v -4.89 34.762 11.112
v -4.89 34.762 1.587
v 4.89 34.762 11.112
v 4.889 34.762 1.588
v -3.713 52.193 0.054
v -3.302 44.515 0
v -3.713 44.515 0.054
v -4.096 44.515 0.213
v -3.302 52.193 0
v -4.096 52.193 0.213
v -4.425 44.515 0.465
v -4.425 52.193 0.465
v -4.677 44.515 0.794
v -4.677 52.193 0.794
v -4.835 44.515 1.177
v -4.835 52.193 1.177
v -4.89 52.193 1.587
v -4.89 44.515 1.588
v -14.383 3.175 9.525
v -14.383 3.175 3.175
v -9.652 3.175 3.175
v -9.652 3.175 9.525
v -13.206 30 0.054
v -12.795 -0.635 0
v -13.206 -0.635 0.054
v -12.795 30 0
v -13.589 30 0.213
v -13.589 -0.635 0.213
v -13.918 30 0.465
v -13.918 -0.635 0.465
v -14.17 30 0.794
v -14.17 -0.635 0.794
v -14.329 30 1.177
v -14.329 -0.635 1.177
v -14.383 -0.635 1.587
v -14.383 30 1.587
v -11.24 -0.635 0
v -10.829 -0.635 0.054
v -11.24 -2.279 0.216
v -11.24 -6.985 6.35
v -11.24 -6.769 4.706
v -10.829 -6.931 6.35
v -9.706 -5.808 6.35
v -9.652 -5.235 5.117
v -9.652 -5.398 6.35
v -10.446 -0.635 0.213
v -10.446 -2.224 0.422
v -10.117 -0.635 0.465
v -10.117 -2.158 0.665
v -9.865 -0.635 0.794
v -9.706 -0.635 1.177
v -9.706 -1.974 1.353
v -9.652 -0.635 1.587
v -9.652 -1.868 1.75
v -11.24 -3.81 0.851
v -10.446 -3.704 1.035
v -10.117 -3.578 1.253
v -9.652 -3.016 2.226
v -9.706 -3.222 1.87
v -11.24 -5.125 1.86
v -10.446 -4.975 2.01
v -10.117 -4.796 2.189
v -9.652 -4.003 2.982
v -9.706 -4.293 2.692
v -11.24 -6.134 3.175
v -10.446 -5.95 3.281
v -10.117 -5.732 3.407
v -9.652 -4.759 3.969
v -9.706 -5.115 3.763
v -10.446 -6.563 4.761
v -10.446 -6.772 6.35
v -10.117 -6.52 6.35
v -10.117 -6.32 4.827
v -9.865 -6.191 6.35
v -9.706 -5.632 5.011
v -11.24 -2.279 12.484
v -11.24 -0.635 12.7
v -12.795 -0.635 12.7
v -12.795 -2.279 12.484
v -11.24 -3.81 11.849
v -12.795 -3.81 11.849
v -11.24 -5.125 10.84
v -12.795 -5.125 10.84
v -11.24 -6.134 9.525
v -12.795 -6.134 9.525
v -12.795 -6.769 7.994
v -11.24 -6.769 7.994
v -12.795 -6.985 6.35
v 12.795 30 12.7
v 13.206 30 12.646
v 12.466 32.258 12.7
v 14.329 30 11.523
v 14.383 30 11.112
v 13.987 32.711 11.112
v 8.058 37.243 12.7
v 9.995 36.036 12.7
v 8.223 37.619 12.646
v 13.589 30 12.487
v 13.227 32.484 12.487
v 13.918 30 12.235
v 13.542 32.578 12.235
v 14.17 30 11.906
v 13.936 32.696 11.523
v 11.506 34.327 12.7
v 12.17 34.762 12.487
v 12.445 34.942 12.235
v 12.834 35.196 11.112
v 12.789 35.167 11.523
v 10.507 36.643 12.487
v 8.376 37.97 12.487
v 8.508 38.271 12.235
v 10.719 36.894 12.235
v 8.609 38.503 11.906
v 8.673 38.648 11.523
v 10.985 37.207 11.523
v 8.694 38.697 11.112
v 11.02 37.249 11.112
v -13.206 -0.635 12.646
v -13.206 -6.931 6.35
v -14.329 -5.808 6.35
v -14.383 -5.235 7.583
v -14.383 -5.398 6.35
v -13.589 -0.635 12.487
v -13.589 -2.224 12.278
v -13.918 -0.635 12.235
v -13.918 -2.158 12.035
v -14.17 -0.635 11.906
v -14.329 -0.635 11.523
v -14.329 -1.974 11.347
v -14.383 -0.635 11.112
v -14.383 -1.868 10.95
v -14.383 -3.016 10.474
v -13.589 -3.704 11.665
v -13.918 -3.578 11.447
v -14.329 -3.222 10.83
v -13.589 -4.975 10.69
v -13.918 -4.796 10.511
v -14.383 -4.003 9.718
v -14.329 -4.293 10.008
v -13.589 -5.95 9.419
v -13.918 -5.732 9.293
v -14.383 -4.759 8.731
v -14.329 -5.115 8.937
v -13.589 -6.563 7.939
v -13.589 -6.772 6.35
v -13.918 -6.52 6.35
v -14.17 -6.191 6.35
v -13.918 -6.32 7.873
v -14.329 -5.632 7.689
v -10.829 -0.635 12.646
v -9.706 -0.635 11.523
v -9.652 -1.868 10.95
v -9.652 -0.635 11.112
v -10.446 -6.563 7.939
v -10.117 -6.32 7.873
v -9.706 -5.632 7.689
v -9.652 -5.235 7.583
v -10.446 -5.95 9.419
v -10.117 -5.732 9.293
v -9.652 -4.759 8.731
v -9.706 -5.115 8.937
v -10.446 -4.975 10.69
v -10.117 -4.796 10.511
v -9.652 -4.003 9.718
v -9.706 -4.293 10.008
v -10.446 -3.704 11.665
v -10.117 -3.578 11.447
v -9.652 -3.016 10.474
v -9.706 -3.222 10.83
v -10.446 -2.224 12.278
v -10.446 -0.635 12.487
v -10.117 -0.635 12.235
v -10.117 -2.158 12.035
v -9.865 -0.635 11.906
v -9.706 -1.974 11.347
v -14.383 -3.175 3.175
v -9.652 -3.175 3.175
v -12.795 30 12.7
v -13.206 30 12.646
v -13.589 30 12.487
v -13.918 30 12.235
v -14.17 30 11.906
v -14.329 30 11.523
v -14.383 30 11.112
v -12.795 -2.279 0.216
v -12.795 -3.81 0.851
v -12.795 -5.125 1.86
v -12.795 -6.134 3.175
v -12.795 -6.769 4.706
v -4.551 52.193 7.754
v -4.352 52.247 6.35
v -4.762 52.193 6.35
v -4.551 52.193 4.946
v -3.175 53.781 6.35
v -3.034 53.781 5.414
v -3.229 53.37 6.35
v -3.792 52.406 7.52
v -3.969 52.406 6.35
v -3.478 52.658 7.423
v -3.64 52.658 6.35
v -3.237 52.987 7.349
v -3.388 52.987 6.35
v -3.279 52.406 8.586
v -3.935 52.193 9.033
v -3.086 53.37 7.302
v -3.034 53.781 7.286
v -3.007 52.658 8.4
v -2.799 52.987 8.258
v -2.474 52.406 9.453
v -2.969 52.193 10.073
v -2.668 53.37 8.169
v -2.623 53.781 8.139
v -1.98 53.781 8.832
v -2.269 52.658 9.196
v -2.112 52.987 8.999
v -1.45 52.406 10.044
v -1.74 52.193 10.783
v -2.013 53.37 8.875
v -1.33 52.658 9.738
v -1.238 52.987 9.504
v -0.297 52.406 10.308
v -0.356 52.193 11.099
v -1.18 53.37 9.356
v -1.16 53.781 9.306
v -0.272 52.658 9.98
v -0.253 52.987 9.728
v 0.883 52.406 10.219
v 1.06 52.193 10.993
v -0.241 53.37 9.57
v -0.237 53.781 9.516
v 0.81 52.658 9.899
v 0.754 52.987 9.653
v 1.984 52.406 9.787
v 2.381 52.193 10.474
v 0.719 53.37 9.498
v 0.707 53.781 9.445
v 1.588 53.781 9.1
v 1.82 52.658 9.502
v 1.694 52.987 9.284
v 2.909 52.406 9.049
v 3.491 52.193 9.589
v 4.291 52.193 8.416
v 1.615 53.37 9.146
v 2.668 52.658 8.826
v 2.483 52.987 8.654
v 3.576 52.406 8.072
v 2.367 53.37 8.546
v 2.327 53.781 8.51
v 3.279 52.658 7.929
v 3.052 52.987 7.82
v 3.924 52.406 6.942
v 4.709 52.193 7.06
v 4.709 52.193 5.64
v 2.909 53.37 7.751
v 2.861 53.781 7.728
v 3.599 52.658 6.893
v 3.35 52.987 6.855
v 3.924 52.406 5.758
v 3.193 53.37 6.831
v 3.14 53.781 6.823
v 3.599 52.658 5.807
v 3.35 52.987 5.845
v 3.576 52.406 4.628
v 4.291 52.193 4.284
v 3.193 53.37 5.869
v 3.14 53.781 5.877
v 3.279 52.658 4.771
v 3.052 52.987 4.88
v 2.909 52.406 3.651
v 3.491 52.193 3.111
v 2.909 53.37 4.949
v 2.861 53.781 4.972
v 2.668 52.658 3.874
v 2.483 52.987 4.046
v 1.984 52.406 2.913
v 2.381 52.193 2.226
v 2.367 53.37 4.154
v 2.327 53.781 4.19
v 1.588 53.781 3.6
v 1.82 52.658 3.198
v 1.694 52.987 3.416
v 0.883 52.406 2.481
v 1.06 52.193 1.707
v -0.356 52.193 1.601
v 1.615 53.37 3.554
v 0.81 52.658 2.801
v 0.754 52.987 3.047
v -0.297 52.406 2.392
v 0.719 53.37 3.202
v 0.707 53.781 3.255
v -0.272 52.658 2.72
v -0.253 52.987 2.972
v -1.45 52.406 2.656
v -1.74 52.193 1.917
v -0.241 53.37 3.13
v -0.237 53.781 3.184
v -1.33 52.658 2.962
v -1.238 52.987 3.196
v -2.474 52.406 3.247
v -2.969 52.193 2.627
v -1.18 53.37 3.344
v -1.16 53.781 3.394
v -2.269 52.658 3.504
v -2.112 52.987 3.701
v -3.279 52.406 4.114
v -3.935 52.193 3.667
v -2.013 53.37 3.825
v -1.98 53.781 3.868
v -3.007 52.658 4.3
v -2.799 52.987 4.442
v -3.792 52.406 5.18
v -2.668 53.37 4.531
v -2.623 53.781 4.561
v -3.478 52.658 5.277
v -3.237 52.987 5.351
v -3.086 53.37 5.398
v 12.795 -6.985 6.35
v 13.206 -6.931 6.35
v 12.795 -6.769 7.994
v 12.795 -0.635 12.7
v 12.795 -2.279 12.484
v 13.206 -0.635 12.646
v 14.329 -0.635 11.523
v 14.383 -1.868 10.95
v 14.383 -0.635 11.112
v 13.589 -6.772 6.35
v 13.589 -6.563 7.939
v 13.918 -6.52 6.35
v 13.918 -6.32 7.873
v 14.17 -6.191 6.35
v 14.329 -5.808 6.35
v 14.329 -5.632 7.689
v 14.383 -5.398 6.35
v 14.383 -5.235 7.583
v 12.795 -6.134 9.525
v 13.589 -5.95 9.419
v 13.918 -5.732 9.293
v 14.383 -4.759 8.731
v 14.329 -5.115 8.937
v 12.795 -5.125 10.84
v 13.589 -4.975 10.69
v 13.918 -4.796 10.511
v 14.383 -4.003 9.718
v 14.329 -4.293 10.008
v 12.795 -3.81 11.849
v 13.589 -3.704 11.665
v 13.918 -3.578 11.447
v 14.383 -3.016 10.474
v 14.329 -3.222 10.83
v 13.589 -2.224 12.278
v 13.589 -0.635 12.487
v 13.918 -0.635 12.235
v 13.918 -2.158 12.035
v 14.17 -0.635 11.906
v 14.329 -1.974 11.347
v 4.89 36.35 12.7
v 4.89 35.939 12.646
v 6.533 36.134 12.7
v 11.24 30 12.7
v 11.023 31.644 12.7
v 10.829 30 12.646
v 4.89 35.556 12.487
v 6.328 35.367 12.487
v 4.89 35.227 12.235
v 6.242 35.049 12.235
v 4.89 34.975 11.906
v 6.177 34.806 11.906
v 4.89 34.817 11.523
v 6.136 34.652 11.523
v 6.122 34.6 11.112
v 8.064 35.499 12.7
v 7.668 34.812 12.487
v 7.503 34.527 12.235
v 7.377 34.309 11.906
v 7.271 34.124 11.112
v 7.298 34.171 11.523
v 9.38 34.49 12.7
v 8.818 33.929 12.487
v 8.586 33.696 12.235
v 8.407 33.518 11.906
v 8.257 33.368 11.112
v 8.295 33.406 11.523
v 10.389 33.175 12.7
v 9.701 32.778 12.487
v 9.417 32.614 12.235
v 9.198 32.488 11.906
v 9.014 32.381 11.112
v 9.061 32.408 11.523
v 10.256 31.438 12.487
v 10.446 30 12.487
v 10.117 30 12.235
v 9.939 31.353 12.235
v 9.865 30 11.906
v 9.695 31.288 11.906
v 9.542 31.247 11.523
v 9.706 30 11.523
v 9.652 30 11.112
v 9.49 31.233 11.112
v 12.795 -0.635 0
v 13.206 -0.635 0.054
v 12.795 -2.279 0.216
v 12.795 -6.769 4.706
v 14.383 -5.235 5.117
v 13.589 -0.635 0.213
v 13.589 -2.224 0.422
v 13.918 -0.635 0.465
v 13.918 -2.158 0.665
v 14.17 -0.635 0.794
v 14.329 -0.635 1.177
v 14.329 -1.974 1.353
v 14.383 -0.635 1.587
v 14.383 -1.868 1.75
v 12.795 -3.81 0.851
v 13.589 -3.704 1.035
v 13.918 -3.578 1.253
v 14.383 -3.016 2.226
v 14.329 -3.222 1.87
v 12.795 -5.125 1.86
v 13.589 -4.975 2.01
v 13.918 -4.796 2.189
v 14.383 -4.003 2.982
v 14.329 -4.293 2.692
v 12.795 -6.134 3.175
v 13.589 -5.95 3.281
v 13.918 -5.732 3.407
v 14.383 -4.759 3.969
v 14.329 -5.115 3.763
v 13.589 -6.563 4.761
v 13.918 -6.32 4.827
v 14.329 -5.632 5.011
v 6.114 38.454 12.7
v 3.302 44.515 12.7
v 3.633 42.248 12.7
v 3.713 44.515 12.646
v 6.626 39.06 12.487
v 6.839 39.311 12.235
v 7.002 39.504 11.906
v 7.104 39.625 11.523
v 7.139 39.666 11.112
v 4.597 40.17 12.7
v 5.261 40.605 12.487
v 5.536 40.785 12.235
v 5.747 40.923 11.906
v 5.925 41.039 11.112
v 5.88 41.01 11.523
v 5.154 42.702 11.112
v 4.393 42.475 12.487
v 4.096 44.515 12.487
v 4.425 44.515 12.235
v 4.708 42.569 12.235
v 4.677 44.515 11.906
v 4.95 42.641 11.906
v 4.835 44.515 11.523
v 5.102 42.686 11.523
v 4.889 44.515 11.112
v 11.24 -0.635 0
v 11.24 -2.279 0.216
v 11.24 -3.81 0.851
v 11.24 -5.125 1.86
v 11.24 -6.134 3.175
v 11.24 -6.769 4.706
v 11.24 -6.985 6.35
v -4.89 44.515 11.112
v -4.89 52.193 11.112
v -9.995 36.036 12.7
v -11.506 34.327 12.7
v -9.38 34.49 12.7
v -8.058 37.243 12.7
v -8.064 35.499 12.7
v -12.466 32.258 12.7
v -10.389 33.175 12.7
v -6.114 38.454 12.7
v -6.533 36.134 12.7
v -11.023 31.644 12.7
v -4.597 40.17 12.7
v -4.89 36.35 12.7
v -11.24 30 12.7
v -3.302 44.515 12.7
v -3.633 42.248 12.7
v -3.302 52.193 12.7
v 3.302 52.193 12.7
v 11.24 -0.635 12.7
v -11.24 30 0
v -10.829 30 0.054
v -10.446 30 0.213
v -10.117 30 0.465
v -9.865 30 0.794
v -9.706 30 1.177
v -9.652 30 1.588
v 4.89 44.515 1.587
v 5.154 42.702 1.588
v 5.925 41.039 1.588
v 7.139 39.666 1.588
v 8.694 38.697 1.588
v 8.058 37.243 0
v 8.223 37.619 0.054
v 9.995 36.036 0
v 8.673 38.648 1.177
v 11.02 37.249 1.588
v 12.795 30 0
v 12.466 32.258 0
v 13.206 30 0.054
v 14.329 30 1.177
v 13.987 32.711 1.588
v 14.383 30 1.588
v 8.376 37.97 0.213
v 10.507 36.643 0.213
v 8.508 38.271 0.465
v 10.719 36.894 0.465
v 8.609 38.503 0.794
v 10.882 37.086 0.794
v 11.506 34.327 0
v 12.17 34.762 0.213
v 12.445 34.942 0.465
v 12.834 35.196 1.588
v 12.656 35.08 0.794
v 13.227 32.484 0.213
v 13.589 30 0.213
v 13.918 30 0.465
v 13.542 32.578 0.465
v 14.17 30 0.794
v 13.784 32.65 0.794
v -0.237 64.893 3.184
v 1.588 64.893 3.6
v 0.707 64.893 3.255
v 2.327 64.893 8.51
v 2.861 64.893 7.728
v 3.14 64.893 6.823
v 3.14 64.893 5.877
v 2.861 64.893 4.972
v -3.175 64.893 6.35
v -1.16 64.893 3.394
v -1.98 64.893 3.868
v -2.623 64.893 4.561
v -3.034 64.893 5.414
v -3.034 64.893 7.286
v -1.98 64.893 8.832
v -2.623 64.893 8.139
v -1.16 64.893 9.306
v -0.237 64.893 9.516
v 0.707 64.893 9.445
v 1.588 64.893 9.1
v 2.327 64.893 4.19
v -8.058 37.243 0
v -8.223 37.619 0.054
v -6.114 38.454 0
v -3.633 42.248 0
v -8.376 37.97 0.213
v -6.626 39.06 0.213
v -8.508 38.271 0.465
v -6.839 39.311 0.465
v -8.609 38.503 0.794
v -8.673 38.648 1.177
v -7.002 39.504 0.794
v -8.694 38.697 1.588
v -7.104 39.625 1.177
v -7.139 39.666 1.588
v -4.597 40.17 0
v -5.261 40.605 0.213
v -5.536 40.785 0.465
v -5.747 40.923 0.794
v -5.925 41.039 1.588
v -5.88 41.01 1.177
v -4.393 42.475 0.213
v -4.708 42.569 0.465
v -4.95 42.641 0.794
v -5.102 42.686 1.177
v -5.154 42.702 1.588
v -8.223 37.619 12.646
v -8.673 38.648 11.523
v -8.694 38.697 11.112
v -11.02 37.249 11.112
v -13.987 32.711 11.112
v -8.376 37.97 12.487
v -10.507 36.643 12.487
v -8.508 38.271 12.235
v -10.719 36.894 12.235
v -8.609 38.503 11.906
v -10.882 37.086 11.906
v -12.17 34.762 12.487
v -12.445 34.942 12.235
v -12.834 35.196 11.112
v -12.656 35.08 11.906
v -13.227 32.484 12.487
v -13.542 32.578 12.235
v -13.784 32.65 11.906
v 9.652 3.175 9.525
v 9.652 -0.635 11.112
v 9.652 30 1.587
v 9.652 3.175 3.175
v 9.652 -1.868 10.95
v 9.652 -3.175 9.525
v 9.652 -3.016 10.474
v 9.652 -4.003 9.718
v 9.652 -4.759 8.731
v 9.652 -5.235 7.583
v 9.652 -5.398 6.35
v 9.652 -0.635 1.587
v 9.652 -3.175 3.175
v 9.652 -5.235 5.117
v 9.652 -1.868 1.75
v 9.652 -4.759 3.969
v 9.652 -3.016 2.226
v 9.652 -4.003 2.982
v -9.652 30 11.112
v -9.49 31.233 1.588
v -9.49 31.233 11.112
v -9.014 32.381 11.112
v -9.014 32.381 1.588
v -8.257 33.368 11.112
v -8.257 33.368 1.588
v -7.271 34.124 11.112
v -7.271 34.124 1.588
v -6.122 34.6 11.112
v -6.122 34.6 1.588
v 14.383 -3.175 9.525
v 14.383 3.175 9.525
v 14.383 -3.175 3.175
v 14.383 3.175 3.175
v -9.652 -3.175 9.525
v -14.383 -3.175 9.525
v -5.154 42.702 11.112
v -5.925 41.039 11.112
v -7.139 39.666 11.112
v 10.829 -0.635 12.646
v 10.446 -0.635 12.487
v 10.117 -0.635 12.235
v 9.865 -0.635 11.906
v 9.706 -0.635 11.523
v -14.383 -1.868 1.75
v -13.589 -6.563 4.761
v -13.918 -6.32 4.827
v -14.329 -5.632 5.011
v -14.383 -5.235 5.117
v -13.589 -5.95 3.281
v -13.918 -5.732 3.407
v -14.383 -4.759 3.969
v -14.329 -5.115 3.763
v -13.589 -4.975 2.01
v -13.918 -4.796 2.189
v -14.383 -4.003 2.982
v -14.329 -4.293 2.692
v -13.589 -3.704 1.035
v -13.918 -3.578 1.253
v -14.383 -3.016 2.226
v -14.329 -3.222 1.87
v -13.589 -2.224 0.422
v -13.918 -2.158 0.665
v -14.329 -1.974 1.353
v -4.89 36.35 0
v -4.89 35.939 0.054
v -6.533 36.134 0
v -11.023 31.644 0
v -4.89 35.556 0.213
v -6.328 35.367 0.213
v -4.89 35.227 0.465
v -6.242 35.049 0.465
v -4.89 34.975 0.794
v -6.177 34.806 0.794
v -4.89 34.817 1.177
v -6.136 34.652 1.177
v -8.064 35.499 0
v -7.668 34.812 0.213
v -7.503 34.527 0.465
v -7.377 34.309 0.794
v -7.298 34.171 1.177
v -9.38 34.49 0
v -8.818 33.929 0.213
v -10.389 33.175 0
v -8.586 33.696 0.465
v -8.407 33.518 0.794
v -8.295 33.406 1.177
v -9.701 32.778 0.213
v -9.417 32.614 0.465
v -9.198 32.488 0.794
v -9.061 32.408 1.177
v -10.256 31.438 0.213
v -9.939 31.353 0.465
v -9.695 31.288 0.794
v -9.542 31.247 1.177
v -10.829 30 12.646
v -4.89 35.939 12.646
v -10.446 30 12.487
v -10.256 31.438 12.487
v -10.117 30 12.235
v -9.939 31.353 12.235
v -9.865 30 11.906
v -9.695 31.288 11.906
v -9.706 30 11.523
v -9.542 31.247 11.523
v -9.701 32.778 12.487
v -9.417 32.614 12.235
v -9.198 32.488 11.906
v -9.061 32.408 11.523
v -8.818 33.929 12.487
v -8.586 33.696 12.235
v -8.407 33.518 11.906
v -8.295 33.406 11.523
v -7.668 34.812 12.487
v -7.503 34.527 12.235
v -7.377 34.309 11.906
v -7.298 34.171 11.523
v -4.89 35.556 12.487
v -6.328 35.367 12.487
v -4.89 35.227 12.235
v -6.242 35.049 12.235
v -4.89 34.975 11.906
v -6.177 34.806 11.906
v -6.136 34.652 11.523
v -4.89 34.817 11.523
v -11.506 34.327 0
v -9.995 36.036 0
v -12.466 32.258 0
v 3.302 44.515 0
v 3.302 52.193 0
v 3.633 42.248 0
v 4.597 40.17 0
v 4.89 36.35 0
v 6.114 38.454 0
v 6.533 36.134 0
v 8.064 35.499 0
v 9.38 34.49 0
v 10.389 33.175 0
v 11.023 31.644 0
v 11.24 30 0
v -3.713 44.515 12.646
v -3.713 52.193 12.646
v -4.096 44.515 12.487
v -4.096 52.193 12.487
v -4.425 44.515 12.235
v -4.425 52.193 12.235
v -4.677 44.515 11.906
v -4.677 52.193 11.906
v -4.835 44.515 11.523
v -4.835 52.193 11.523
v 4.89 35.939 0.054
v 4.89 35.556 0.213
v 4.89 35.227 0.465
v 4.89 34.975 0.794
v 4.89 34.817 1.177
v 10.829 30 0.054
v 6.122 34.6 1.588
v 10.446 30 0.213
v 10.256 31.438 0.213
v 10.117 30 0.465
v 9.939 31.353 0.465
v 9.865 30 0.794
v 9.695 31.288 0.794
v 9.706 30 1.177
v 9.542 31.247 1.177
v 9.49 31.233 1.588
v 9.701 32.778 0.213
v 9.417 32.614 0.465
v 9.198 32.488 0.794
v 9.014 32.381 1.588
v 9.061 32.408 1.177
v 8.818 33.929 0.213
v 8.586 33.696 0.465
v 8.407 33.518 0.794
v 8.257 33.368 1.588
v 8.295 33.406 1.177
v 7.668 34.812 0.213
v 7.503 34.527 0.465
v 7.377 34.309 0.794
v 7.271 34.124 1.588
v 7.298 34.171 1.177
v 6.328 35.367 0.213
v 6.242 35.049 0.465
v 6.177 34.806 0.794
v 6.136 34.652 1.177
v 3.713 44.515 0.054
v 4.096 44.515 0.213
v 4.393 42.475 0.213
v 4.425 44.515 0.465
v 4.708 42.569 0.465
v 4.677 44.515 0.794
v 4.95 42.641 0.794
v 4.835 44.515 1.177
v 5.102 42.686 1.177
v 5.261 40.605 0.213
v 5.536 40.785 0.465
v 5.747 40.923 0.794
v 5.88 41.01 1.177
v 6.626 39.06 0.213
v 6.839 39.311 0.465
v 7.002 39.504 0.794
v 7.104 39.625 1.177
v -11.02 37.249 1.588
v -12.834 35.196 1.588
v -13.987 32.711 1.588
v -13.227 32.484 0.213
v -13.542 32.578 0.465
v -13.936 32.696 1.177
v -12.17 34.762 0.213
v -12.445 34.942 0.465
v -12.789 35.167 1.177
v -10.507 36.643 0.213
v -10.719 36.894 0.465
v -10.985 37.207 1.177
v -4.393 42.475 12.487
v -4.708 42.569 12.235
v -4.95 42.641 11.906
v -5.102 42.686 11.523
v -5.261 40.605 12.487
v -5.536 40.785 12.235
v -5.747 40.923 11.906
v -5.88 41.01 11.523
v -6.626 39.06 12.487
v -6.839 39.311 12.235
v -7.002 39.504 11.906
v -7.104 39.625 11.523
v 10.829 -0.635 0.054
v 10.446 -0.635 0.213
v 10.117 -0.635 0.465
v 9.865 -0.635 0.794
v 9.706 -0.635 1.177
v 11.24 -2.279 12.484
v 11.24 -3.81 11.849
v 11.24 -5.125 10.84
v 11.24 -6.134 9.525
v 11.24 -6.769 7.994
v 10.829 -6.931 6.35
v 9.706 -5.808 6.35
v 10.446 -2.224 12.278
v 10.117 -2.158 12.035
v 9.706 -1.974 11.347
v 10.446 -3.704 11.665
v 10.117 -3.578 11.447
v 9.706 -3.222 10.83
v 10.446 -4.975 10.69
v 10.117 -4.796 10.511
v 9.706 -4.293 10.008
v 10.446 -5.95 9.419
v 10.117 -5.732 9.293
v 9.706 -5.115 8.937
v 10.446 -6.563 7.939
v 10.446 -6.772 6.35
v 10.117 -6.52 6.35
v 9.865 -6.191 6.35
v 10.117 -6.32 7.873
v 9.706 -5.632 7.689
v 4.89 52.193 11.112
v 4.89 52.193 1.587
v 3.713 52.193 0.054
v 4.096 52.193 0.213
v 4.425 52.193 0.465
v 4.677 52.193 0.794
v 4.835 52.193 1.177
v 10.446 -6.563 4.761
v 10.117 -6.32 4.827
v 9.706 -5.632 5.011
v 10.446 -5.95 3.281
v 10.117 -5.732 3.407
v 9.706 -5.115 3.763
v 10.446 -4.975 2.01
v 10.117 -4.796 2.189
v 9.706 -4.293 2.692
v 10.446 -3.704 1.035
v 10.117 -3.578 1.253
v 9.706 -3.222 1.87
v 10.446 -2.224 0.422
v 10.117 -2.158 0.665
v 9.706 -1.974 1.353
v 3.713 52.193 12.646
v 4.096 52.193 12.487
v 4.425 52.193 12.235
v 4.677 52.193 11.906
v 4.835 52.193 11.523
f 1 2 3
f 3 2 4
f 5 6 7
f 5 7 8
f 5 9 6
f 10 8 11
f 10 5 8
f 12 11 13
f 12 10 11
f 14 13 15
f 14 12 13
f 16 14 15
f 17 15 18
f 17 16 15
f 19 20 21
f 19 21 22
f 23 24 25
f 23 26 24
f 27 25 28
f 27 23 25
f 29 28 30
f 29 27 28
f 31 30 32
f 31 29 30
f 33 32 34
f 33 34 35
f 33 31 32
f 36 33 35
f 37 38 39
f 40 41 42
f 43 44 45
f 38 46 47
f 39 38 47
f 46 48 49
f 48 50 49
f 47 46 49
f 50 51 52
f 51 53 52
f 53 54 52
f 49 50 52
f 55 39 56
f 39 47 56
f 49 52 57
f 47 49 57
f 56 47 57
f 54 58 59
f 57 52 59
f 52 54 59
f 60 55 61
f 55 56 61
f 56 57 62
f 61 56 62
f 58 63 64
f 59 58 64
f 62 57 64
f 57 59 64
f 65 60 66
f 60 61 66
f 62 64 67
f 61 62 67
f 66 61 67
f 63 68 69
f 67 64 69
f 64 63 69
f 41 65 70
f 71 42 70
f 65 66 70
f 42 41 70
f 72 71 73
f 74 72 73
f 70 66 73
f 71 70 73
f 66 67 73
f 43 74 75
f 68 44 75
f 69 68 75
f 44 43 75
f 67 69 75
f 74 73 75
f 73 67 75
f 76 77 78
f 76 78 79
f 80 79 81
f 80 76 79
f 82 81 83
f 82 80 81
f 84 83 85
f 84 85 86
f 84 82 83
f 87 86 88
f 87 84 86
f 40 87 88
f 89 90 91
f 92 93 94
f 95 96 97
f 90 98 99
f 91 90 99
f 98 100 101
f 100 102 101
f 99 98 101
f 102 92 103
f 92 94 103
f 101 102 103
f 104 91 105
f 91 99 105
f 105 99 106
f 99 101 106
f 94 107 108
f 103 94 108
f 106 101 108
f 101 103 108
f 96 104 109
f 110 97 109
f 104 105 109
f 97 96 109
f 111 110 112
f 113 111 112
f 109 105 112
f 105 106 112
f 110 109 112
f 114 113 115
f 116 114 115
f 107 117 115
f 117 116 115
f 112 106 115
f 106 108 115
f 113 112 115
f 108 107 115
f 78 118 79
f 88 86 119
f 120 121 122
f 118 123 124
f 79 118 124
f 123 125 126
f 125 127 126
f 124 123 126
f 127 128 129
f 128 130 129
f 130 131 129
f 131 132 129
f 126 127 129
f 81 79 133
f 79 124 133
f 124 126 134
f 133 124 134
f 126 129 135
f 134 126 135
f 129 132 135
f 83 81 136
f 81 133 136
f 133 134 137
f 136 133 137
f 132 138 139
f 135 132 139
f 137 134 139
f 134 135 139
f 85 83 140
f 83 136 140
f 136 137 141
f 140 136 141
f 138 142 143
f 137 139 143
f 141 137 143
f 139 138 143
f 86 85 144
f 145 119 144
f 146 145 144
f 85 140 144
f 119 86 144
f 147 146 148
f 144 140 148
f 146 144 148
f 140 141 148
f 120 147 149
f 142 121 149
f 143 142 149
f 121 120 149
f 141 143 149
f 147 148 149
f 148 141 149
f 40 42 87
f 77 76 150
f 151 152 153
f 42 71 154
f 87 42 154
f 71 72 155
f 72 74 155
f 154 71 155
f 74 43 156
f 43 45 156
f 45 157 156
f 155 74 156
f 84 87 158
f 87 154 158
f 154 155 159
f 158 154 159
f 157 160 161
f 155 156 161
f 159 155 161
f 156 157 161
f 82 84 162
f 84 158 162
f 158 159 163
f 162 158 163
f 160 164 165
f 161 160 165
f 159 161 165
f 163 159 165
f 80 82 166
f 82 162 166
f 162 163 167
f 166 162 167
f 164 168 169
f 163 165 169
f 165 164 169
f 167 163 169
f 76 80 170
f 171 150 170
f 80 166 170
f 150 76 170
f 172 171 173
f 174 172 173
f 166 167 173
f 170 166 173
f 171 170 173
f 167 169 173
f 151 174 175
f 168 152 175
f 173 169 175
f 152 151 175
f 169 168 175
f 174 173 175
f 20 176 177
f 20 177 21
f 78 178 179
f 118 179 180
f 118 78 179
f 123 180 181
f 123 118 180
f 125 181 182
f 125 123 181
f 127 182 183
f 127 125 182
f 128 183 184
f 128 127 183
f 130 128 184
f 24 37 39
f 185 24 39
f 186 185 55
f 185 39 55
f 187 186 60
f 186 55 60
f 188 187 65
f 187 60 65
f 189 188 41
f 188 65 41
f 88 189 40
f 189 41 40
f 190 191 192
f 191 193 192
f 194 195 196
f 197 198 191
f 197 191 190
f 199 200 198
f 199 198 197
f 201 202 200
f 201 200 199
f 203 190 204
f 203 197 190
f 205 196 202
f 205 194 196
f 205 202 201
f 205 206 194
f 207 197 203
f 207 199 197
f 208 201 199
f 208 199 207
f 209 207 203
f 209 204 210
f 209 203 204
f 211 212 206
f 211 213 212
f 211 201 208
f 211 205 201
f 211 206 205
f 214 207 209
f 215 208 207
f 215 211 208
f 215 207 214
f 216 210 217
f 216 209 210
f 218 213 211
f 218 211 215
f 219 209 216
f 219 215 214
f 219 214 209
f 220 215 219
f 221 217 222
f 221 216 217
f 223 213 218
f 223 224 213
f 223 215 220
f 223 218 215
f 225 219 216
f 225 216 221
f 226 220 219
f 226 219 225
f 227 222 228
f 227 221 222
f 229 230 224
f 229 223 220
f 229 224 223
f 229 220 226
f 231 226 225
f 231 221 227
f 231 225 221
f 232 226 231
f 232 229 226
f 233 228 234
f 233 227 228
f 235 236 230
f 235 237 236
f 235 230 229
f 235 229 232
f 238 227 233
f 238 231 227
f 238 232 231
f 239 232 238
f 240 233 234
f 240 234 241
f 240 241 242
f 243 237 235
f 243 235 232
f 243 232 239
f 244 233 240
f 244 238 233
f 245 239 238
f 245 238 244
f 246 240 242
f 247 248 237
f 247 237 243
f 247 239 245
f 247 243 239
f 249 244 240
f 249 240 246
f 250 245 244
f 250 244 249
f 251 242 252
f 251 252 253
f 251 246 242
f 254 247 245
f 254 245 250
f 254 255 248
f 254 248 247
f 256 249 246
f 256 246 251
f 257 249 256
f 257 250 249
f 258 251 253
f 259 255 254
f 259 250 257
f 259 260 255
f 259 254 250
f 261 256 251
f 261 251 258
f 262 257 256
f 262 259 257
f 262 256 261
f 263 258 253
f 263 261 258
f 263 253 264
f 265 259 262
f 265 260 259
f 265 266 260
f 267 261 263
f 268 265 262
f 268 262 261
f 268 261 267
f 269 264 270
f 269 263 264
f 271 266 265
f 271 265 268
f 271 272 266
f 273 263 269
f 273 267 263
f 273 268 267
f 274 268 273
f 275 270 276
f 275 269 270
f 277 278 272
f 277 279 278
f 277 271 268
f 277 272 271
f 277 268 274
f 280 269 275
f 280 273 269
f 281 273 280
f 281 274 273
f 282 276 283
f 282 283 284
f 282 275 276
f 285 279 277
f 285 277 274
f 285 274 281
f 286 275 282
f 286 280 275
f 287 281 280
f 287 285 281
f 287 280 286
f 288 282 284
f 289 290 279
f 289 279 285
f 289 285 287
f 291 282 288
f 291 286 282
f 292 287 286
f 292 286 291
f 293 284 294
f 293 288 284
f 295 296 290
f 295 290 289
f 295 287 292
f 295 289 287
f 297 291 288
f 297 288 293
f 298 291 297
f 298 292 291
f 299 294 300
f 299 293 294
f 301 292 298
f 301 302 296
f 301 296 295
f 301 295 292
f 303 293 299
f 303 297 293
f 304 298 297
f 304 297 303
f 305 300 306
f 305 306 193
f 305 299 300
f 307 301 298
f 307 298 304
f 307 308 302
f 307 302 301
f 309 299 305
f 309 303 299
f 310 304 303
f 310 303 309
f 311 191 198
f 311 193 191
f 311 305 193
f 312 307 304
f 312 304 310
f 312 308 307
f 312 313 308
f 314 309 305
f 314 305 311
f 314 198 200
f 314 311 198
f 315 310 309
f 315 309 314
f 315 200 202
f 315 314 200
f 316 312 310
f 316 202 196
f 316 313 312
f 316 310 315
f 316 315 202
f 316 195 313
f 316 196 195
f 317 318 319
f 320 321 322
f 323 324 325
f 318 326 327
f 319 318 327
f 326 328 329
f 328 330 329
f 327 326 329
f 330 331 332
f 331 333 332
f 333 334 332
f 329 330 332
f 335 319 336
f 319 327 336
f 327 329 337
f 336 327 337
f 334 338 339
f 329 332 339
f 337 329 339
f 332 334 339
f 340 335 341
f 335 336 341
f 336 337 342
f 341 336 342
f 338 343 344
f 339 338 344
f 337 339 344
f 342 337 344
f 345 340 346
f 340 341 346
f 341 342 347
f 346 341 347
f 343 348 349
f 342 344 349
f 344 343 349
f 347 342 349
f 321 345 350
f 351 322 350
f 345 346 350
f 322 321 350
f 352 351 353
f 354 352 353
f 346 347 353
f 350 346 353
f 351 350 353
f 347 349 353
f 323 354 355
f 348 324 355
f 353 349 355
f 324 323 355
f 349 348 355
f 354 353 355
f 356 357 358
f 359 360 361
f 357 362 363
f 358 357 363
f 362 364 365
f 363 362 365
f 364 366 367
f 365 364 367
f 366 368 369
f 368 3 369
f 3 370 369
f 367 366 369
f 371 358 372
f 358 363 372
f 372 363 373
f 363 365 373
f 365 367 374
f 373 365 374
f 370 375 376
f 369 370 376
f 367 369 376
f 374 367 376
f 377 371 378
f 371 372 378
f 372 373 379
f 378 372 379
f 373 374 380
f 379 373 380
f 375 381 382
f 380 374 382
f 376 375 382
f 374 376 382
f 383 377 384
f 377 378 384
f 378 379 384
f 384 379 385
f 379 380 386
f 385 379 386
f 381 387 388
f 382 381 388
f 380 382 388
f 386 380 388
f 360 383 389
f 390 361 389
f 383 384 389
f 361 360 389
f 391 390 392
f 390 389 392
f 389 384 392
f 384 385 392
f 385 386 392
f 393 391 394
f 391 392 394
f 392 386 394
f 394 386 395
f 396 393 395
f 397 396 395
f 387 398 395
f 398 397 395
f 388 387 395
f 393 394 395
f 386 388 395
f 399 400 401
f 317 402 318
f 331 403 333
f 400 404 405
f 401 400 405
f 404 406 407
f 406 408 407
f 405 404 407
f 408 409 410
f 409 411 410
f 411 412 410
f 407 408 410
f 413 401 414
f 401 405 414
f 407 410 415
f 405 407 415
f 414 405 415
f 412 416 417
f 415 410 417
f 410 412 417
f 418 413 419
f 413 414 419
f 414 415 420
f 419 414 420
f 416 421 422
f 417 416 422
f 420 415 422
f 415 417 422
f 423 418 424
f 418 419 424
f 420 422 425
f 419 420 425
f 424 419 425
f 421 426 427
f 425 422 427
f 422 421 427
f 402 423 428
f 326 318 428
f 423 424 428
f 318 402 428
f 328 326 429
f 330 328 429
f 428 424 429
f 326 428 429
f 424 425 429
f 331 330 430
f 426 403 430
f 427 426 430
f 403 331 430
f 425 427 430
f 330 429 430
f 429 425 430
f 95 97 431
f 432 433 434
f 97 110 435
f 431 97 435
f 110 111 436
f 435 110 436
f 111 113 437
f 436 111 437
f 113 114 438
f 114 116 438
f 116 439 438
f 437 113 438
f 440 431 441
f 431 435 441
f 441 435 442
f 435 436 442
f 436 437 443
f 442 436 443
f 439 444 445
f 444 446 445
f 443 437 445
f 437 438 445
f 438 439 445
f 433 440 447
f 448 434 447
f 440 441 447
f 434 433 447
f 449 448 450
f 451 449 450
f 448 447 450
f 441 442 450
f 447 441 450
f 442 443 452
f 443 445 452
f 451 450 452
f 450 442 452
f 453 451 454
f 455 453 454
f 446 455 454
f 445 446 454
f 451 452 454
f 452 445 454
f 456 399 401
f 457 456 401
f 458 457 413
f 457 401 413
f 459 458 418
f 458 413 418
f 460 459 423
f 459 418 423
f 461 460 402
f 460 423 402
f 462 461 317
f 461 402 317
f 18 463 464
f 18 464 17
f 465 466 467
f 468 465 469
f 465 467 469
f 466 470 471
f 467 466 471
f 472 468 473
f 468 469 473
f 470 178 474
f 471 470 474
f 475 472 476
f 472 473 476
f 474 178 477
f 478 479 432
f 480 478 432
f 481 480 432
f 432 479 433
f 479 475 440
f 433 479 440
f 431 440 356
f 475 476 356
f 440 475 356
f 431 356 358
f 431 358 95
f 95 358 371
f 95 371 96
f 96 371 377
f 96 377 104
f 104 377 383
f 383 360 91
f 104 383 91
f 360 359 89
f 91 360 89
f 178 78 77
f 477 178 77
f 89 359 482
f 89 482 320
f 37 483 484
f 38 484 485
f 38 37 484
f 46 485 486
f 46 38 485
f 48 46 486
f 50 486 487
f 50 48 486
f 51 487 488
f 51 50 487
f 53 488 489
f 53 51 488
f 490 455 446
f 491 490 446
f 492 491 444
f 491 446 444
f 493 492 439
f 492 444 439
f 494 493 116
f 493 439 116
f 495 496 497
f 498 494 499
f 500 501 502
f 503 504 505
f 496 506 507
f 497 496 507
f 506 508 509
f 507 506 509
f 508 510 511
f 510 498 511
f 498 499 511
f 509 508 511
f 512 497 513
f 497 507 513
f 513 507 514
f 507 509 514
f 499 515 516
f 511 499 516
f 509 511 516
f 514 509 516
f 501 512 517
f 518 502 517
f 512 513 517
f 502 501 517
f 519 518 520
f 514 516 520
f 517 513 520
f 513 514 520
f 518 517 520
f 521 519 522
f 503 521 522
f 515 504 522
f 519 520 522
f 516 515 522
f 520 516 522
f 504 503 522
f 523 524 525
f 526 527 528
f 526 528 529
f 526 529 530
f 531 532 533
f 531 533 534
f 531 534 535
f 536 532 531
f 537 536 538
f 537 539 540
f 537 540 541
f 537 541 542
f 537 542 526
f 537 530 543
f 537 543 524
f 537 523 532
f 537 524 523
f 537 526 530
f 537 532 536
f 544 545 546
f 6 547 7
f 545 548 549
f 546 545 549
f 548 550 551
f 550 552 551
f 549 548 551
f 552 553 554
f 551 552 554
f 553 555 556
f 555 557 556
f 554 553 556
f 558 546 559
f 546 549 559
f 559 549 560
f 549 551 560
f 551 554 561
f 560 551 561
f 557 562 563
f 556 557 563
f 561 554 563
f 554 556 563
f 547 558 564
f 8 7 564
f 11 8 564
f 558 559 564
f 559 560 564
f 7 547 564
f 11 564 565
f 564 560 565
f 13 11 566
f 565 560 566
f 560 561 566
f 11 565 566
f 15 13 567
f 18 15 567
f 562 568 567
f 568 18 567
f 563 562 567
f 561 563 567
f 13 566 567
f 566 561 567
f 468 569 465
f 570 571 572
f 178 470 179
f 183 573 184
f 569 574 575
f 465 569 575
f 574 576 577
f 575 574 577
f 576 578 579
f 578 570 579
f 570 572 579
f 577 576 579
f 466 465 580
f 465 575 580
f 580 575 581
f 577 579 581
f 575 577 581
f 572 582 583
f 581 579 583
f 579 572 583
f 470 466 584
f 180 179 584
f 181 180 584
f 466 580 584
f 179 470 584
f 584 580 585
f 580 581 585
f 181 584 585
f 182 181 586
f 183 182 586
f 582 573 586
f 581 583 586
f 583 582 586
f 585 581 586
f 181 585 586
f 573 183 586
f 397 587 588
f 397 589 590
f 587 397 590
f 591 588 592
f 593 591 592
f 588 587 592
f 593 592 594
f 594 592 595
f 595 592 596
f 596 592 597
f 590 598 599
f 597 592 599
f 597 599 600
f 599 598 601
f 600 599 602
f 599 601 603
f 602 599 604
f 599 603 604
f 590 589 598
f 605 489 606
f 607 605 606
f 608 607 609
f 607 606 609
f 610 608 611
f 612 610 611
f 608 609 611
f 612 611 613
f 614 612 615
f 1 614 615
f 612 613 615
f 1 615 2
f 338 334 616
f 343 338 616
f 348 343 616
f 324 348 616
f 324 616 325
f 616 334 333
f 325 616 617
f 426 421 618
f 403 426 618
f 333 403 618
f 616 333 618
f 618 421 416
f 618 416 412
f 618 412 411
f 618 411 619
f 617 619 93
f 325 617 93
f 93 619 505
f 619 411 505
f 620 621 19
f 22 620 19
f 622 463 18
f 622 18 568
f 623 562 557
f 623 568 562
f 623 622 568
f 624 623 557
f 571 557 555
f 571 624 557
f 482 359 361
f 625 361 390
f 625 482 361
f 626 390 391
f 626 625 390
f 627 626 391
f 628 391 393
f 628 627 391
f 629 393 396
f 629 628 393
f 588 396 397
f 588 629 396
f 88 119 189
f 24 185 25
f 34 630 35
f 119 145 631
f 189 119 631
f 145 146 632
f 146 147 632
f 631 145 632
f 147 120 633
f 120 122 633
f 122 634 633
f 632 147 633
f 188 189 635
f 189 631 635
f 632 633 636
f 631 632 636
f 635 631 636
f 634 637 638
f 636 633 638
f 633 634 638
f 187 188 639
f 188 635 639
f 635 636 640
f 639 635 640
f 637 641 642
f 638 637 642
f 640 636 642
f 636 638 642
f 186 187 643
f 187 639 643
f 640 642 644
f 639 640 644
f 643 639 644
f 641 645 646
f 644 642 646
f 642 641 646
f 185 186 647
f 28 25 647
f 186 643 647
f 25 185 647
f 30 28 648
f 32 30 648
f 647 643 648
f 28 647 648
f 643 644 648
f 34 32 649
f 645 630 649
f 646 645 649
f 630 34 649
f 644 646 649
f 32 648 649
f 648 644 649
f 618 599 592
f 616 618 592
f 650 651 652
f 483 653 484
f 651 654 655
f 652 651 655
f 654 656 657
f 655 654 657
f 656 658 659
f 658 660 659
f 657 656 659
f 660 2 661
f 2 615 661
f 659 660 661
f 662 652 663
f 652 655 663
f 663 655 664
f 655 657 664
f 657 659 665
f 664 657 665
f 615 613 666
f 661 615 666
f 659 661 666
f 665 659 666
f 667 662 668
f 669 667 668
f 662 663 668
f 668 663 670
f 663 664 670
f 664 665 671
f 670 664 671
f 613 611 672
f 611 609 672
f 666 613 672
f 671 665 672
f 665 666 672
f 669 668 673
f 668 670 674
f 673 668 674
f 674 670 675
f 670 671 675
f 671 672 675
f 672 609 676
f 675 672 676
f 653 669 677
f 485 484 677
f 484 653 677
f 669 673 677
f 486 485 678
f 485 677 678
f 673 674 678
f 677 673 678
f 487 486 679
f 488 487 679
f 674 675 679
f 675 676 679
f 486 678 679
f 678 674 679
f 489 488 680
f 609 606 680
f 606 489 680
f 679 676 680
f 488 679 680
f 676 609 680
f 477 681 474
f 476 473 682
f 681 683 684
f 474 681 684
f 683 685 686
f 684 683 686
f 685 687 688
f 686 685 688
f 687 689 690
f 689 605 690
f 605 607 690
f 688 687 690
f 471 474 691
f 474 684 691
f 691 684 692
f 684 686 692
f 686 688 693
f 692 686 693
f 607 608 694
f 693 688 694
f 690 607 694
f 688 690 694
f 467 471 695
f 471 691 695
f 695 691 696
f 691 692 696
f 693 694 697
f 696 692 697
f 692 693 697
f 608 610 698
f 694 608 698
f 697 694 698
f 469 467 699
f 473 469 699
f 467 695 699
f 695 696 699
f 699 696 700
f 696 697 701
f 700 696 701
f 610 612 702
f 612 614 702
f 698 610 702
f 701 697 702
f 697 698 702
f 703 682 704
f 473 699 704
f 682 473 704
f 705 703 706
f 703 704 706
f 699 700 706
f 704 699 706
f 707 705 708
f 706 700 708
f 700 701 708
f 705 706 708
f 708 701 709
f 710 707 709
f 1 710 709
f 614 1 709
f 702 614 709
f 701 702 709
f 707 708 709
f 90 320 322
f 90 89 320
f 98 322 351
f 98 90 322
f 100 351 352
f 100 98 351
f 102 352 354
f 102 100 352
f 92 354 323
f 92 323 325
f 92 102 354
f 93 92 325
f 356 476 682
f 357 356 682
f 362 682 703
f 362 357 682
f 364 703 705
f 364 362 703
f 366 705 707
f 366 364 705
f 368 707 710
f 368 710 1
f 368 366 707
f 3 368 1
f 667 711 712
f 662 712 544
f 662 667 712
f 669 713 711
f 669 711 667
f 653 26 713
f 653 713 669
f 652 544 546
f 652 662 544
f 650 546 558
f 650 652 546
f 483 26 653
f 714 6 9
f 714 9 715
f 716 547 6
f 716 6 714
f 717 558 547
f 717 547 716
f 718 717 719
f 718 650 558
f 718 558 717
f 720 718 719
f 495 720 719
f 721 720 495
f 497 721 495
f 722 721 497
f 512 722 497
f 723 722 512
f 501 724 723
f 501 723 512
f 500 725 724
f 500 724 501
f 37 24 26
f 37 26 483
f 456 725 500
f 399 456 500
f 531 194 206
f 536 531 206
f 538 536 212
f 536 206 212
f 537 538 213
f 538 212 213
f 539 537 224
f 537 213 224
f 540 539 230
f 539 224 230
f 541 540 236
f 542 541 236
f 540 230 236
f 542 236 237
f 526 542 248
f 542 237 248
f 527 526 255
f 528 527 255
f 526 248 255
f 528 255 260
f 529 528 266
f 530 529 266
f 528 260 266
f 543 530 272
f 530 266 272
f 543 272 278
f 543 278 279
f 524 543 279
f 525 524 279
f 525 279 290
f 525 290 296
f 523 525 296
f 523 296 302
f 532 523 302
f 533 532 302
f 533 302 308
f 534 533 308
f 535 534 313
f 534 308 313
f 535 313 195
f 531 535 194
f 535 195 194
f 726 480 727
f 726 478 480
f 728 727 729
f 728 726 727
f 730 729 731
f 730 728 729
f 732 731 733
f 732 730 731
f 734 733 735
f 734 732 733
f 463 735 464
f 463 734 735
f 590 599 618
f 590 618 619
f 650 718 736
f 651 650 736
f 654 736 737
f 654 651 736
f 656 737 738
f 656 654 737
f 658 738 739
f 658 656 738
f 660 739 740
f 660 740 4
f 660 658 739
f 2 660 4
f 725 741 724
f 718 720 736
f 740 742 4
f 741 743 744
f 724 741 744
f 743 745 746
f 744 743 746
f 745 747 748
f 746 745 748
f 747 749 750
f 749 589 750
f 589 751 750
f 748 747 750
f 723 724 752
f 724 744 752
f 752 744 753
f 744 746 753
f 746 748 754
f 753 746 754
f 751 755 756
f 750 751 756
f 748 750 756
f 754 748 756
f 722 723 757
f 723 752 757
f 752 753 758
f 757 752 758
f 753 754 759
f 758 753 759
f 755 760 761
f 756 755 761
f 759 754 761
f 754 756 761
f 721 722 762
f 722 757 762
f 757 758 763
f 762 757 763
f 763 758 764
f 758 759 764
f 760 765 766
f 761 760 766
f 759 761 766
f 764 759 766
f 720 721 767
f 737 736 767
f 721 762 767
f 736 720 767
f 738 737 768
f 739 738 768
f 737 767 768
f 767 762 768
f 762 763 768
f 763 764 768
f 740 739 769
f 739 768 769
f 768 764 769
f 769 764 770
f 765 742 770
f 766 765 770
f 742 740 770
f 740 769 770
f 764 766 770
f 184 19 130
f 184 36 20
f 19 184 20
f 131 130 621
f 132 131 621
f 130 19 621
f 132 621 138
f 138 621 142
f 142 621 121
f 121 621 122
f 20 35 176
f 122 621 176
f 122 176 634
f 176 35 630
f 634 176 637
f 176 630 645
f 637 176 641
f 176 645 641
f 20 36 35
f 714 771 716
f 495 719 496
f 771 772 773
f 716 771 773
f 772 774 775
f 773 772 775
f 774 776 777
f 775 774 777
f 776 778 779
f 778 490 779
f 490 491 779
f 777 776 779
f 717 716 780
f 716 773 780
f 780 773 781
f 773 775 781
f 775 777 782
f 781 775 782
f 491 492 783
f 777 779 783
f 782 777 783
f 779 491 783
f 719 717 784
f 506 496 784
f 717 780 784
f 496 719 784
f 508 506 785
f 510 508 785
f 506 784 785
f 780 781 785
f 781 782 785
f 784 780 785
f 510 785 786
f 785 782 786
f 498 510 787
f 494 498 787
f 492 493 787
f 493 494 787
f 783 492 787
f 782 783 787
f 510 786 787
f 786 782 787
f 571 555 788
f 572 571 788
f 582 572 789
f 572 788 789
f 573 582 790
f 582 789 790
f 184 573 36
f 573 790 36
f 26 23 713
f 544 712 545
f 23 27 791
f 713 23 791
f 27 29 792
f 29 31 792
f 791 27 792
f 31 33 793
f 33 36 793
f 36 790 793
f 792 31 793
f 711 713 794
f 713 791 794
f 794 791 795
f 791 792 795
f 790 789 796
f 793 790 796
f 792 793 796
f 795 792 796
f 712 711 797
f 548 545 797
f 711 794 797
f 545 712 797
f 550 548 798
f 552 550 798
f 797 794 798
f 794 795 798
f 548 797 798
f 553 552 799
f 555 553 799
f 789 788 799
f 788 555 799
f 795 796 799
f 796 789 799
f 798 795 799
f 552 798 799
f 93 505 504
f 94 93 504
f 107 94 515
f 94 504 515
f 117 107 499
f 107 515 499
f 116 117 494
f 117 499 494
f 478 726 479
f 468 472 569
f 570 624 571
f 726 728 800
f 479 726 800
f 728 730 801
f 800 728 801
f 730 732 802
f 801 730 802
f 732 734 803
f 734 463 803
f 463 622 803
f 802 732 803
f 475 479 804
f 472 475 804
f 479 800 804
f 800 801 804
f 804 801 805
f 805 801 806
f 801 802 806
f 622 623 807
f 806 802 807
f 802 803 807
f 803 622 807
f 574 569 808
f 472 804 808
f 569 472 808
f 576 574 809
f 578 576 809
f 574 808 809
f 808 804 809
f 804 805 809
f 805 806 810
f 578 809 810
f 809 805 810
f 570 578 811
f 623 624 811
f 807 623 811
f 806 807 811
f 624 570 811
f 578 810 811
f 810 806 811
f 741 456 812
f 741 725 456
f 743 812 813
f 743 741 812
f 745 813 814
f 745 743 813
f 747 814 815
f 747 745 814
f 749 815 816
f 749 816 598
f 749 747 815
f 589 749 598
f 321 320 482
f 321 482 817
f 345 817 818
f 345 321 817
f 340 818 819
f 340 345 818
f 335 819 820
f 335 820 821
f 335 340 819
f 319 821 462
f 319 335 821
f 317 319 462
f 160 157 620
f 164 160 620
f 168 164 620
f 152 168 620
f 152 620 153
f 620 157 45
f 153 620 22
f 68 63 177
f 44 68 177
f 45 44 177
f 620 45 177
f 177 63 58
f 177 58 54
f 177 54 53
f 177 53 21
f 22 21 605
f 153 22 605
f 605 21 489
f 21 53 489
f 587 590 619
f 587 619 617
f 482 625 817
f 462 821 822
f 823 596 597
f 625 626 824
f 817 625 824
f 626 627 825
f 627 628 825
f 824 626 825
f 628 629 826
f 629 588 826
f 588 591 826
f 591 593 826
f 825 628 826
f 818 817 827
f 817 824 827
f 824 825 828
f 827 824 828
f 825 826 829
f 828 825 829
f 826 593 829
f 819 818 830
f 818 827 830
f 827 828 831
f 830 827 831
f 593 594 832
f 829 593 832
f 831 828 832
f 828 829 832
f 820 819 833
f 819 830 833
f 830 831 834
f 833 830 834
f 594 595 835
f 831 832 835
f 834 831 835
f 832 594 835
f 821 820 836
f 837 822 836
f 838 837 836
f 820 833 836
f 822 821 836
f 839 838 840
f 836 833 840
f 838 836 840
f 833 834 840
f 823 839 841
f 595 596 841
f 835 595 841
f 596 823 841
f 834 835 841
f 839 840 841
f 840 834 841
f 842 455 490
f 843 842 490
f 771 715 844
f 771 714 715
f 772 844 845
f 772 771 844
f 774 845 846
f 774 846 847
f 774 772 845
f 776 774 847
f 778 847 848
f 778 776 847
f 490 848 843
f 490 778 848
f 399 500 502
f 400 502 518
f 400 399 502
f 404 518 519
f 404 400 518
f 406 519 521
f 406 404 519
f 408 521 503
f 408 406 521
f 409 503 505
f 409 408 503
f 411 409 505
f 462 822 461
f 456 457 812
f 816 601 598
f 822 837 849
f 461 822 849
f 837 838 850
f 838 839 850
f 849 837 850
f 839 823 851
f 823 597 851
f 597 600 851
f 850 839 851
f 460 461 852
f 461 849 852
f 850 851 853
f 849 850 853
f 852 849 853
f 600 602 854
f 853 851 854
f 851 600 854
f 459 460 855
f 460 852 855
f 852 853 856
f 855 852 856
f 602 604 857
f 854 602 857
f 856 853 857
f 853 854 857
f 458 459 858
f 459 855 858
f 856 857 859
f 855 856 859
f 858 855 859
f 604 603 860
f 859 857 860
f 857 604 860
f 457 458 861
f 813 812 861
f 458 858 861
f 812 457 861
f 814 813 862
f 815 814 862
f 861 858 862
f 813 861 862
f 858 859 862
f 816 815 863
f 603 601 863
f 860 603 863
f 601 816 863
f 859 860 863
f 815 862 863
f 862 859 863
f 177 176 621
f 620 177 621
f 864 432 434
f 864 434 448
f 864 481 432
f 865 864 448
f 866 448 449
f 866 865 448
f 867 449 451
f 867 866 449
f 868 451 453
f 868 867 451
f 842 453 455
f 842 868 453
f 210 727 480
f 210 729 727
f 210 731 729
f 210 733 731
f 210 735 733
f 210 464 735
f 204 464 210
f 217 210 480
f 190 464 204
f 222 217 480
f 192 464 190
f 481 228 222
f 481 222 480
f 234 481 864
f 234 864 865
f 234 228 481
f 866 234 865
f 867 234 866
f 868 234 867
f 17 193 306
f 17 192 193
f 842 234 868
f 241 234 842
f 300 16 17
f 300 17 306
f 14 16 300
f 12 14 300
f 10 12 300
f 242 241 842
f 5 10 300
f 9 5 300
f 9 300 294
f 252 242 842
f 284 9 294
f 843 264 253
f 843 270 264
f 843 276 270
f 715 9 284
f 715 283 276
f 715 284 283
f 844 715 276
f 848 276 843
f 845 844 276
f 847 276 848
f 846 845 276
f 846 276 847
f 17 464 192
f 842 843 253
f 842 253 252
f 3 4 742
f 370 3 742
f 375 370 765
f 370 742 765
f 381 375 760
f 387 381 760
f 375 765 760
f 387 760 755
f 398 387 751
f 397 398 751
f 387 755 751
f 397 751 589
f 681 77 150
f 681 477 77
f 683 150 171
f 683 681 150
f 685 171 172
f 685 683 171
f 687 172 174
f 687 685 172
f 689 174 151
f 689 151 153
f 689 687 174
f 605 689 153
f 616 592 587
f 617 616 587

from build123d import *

# Parameters (mm, degrees)
BOSS_EXTRUDE1_DEPTH = 12.7
SKETCH2_W           = 9.779
SKETCH2_H           = 12.7
BOSS_EXTRUDE2_DEPTH = 12.7
FILLET1_R           = 6.35
SKETCH3_R           = 3.175
BOSS_EXTRUDE3_DEPTH = 12.7
SKETCH4_W           = 6.35
SKETCH4_H           = 6.35
CUT_EXTRUDE1_DEPTH  = 43.688
FILLET2_R           = 6.35
FILLET5_R           = 1.5875
FILLET7_R           = 1.5875


with BuildPart() as part:
    # Sketch1 → Boss-Extrude1 (new body)
    with BuildSketch(Plane.XY):
        with BuildLine():
            Line((9.652, 30), (9.652, -6.985))
            Line((9.652, -6.985), (14.38275, -6.985))
            Line((14.38275, -6.985), (14.38275, 30))
            ThreePointArc((14.38275, 30), (11.60224145, 36.71274145), (4.8895, 39.49325))
            Line((4.8895, 39.49325), (-4.8895, 39.49325))
            ThreePointArc((-4.8895, 39.49325), (-11.60224145, 36.71274145), (-14.38275, 30))
            Line((-14.38275, 30), (-14.38275, -6.985))
            Line((-14.38275, -6.985), (-9.652, -6.985))
            Line((-9.652, -6.985), (-9.652, 30))
            ThreePointArc((-9.652, 30), (-8.257096045, 33.367596045), (-4.8895, 34.7625))
            Line((-4.8895, 34.7625), (4.8895, 34.7625))
            ThreePointArc((4.8895, 34.7625), (8.257096045, 33.367596045), (9.652, 30))
        make_face()
    extrude(amount=BOSS_EXTRUDE1_DEPTH)

    # Sketch2 → Boss-Extrude2 (add)
    with BuildSketch(Plane(origin=(0, 39.49325, 0), x_dir=(1, 0, 0), z_dir=(0, 1, 0))):
        with Locations((0, -6.35)):
            Rectangle(SKETCH2_W, SKETCH2_H)
    extrude(amount=BOSS_EXTRUDE2_DEPTH)

    # Fillet1
    fillet1_edges = [part.edges().sort_by_distance(p)[0] for p in [
        (4.8895, 39.49325, 6.35),
        (-4.8895, 39.49325, 6.35),
    ]]
    fillet(fillet1_edges, radius=FILLET1_R)

    # Sketch3 → Boss-Extrude3 (add)
    with BuildSketch(Plane(origin=(0, 52.19325, 0), x_dir=(1, 0, 0), z_dir=(0, 1, 0))):
        with Locations(Location((0, -6.35, 0), (0, 0, 180))):
            Circle(SKETCH3_R)
    extrude(amount=BOSS_EXTRUDE3_DEPTH)

    # Sketch4 → Cut-Extrude1 (cut)
    with BuildSketch(Plane.ZY.offset(14.38275)):
        with Locations((6.35, 0)):
            Rectangle(SKETCH4_W, SKETCH4_H)
    extrude(amount=-CUT_EXTRUDE1_DEPTH, mode=Mode.SUBTRACT)

    # Fillet2
    fillet2_edges = [part.edges().sort_by_distance(p)[0] for p in [
        (12.017375, -6.985, 0),
        (12.017375, -6.985, 12.7),
        (-12.017375, -6.985, 0),
        (-12.017375, -6.985, 12.7),
    ]]
    fillet(fillet2_edges, radius=FILLET2_R - 0.0001)  # a hair under: the kernel refuses the full size

    # Fillet5
    fillet5_edges = [part.edges().sort_by_distance(p)[0] for p in [
        (-14.38275, 14.68245, 12.7),
        (-9.652, 14.68245, 12.7),
        (9.652, 14.68245, 12.7),
        (14.38275, 14.68245, 12.7),
        (14.38275, 14.68245, 0),
        (14.38275, -5.12515735, 1.85984265),
        (14.38275, -5.12515735, 10.84015735),
        (9.652, 14.68245, 0),
        (9.652, -5.12515735, 1.85984265),
        (9.652, -5.12515735, 10.84015735),
        (-9.652, 14.68245, 0),
        (-14.38275, 14.68245, 0),
        (-9.652, -5.12515735, 1.85984265),
        (-9.652, -5.12515735, 10.84015735),
        (-14.38275, -5.12515735, 1.85984265),
        (-14.38275, -5.12515735, 10.84015735),
        (12.83439634, 35.196192617, 0),
        (8.257096045, 33.367596045, 0),
        (0, 34.7625, 0),
        (-8.257096045, 33.367596045, 0),
        (-8.257096045, 33.367596045, 12.7),
        (0, 34.7625, 12.7),
        (-4.8895, 48.354139564, 0),
        (-4.8895, 48.354139564, 12.7),
        (4.8895, 48.354139564, 12.7),
        (4.8895, 48.354139564, 0),
        (8.257096045, 33.367596045, 12.7),
        (-12.83439634, 35.196192617, 0),
        (-12.83439634, 35.196192617, 12.7),
        (-5.925188067, 41.039315002, 0),
        (-5.925188067, 41.039315002, 12.7),
        (5.925188067, 41.039315002, 0),
        (5.925188067, 41.039315002, 12.7),
        (12.83439634, 35.196192617, 12.7),
    ]]
    fillet(fillet5_edges, radius=FILLET5_R)

    # Fillet7
    fillet7_edges = [part.edges().sort_by_distance(p)[0] for p in [
        (3.175, 52.19325, 6.35),
    ]]
    fillet(fillet7_edges, radius=FILLET7_R)


solid = part.part
